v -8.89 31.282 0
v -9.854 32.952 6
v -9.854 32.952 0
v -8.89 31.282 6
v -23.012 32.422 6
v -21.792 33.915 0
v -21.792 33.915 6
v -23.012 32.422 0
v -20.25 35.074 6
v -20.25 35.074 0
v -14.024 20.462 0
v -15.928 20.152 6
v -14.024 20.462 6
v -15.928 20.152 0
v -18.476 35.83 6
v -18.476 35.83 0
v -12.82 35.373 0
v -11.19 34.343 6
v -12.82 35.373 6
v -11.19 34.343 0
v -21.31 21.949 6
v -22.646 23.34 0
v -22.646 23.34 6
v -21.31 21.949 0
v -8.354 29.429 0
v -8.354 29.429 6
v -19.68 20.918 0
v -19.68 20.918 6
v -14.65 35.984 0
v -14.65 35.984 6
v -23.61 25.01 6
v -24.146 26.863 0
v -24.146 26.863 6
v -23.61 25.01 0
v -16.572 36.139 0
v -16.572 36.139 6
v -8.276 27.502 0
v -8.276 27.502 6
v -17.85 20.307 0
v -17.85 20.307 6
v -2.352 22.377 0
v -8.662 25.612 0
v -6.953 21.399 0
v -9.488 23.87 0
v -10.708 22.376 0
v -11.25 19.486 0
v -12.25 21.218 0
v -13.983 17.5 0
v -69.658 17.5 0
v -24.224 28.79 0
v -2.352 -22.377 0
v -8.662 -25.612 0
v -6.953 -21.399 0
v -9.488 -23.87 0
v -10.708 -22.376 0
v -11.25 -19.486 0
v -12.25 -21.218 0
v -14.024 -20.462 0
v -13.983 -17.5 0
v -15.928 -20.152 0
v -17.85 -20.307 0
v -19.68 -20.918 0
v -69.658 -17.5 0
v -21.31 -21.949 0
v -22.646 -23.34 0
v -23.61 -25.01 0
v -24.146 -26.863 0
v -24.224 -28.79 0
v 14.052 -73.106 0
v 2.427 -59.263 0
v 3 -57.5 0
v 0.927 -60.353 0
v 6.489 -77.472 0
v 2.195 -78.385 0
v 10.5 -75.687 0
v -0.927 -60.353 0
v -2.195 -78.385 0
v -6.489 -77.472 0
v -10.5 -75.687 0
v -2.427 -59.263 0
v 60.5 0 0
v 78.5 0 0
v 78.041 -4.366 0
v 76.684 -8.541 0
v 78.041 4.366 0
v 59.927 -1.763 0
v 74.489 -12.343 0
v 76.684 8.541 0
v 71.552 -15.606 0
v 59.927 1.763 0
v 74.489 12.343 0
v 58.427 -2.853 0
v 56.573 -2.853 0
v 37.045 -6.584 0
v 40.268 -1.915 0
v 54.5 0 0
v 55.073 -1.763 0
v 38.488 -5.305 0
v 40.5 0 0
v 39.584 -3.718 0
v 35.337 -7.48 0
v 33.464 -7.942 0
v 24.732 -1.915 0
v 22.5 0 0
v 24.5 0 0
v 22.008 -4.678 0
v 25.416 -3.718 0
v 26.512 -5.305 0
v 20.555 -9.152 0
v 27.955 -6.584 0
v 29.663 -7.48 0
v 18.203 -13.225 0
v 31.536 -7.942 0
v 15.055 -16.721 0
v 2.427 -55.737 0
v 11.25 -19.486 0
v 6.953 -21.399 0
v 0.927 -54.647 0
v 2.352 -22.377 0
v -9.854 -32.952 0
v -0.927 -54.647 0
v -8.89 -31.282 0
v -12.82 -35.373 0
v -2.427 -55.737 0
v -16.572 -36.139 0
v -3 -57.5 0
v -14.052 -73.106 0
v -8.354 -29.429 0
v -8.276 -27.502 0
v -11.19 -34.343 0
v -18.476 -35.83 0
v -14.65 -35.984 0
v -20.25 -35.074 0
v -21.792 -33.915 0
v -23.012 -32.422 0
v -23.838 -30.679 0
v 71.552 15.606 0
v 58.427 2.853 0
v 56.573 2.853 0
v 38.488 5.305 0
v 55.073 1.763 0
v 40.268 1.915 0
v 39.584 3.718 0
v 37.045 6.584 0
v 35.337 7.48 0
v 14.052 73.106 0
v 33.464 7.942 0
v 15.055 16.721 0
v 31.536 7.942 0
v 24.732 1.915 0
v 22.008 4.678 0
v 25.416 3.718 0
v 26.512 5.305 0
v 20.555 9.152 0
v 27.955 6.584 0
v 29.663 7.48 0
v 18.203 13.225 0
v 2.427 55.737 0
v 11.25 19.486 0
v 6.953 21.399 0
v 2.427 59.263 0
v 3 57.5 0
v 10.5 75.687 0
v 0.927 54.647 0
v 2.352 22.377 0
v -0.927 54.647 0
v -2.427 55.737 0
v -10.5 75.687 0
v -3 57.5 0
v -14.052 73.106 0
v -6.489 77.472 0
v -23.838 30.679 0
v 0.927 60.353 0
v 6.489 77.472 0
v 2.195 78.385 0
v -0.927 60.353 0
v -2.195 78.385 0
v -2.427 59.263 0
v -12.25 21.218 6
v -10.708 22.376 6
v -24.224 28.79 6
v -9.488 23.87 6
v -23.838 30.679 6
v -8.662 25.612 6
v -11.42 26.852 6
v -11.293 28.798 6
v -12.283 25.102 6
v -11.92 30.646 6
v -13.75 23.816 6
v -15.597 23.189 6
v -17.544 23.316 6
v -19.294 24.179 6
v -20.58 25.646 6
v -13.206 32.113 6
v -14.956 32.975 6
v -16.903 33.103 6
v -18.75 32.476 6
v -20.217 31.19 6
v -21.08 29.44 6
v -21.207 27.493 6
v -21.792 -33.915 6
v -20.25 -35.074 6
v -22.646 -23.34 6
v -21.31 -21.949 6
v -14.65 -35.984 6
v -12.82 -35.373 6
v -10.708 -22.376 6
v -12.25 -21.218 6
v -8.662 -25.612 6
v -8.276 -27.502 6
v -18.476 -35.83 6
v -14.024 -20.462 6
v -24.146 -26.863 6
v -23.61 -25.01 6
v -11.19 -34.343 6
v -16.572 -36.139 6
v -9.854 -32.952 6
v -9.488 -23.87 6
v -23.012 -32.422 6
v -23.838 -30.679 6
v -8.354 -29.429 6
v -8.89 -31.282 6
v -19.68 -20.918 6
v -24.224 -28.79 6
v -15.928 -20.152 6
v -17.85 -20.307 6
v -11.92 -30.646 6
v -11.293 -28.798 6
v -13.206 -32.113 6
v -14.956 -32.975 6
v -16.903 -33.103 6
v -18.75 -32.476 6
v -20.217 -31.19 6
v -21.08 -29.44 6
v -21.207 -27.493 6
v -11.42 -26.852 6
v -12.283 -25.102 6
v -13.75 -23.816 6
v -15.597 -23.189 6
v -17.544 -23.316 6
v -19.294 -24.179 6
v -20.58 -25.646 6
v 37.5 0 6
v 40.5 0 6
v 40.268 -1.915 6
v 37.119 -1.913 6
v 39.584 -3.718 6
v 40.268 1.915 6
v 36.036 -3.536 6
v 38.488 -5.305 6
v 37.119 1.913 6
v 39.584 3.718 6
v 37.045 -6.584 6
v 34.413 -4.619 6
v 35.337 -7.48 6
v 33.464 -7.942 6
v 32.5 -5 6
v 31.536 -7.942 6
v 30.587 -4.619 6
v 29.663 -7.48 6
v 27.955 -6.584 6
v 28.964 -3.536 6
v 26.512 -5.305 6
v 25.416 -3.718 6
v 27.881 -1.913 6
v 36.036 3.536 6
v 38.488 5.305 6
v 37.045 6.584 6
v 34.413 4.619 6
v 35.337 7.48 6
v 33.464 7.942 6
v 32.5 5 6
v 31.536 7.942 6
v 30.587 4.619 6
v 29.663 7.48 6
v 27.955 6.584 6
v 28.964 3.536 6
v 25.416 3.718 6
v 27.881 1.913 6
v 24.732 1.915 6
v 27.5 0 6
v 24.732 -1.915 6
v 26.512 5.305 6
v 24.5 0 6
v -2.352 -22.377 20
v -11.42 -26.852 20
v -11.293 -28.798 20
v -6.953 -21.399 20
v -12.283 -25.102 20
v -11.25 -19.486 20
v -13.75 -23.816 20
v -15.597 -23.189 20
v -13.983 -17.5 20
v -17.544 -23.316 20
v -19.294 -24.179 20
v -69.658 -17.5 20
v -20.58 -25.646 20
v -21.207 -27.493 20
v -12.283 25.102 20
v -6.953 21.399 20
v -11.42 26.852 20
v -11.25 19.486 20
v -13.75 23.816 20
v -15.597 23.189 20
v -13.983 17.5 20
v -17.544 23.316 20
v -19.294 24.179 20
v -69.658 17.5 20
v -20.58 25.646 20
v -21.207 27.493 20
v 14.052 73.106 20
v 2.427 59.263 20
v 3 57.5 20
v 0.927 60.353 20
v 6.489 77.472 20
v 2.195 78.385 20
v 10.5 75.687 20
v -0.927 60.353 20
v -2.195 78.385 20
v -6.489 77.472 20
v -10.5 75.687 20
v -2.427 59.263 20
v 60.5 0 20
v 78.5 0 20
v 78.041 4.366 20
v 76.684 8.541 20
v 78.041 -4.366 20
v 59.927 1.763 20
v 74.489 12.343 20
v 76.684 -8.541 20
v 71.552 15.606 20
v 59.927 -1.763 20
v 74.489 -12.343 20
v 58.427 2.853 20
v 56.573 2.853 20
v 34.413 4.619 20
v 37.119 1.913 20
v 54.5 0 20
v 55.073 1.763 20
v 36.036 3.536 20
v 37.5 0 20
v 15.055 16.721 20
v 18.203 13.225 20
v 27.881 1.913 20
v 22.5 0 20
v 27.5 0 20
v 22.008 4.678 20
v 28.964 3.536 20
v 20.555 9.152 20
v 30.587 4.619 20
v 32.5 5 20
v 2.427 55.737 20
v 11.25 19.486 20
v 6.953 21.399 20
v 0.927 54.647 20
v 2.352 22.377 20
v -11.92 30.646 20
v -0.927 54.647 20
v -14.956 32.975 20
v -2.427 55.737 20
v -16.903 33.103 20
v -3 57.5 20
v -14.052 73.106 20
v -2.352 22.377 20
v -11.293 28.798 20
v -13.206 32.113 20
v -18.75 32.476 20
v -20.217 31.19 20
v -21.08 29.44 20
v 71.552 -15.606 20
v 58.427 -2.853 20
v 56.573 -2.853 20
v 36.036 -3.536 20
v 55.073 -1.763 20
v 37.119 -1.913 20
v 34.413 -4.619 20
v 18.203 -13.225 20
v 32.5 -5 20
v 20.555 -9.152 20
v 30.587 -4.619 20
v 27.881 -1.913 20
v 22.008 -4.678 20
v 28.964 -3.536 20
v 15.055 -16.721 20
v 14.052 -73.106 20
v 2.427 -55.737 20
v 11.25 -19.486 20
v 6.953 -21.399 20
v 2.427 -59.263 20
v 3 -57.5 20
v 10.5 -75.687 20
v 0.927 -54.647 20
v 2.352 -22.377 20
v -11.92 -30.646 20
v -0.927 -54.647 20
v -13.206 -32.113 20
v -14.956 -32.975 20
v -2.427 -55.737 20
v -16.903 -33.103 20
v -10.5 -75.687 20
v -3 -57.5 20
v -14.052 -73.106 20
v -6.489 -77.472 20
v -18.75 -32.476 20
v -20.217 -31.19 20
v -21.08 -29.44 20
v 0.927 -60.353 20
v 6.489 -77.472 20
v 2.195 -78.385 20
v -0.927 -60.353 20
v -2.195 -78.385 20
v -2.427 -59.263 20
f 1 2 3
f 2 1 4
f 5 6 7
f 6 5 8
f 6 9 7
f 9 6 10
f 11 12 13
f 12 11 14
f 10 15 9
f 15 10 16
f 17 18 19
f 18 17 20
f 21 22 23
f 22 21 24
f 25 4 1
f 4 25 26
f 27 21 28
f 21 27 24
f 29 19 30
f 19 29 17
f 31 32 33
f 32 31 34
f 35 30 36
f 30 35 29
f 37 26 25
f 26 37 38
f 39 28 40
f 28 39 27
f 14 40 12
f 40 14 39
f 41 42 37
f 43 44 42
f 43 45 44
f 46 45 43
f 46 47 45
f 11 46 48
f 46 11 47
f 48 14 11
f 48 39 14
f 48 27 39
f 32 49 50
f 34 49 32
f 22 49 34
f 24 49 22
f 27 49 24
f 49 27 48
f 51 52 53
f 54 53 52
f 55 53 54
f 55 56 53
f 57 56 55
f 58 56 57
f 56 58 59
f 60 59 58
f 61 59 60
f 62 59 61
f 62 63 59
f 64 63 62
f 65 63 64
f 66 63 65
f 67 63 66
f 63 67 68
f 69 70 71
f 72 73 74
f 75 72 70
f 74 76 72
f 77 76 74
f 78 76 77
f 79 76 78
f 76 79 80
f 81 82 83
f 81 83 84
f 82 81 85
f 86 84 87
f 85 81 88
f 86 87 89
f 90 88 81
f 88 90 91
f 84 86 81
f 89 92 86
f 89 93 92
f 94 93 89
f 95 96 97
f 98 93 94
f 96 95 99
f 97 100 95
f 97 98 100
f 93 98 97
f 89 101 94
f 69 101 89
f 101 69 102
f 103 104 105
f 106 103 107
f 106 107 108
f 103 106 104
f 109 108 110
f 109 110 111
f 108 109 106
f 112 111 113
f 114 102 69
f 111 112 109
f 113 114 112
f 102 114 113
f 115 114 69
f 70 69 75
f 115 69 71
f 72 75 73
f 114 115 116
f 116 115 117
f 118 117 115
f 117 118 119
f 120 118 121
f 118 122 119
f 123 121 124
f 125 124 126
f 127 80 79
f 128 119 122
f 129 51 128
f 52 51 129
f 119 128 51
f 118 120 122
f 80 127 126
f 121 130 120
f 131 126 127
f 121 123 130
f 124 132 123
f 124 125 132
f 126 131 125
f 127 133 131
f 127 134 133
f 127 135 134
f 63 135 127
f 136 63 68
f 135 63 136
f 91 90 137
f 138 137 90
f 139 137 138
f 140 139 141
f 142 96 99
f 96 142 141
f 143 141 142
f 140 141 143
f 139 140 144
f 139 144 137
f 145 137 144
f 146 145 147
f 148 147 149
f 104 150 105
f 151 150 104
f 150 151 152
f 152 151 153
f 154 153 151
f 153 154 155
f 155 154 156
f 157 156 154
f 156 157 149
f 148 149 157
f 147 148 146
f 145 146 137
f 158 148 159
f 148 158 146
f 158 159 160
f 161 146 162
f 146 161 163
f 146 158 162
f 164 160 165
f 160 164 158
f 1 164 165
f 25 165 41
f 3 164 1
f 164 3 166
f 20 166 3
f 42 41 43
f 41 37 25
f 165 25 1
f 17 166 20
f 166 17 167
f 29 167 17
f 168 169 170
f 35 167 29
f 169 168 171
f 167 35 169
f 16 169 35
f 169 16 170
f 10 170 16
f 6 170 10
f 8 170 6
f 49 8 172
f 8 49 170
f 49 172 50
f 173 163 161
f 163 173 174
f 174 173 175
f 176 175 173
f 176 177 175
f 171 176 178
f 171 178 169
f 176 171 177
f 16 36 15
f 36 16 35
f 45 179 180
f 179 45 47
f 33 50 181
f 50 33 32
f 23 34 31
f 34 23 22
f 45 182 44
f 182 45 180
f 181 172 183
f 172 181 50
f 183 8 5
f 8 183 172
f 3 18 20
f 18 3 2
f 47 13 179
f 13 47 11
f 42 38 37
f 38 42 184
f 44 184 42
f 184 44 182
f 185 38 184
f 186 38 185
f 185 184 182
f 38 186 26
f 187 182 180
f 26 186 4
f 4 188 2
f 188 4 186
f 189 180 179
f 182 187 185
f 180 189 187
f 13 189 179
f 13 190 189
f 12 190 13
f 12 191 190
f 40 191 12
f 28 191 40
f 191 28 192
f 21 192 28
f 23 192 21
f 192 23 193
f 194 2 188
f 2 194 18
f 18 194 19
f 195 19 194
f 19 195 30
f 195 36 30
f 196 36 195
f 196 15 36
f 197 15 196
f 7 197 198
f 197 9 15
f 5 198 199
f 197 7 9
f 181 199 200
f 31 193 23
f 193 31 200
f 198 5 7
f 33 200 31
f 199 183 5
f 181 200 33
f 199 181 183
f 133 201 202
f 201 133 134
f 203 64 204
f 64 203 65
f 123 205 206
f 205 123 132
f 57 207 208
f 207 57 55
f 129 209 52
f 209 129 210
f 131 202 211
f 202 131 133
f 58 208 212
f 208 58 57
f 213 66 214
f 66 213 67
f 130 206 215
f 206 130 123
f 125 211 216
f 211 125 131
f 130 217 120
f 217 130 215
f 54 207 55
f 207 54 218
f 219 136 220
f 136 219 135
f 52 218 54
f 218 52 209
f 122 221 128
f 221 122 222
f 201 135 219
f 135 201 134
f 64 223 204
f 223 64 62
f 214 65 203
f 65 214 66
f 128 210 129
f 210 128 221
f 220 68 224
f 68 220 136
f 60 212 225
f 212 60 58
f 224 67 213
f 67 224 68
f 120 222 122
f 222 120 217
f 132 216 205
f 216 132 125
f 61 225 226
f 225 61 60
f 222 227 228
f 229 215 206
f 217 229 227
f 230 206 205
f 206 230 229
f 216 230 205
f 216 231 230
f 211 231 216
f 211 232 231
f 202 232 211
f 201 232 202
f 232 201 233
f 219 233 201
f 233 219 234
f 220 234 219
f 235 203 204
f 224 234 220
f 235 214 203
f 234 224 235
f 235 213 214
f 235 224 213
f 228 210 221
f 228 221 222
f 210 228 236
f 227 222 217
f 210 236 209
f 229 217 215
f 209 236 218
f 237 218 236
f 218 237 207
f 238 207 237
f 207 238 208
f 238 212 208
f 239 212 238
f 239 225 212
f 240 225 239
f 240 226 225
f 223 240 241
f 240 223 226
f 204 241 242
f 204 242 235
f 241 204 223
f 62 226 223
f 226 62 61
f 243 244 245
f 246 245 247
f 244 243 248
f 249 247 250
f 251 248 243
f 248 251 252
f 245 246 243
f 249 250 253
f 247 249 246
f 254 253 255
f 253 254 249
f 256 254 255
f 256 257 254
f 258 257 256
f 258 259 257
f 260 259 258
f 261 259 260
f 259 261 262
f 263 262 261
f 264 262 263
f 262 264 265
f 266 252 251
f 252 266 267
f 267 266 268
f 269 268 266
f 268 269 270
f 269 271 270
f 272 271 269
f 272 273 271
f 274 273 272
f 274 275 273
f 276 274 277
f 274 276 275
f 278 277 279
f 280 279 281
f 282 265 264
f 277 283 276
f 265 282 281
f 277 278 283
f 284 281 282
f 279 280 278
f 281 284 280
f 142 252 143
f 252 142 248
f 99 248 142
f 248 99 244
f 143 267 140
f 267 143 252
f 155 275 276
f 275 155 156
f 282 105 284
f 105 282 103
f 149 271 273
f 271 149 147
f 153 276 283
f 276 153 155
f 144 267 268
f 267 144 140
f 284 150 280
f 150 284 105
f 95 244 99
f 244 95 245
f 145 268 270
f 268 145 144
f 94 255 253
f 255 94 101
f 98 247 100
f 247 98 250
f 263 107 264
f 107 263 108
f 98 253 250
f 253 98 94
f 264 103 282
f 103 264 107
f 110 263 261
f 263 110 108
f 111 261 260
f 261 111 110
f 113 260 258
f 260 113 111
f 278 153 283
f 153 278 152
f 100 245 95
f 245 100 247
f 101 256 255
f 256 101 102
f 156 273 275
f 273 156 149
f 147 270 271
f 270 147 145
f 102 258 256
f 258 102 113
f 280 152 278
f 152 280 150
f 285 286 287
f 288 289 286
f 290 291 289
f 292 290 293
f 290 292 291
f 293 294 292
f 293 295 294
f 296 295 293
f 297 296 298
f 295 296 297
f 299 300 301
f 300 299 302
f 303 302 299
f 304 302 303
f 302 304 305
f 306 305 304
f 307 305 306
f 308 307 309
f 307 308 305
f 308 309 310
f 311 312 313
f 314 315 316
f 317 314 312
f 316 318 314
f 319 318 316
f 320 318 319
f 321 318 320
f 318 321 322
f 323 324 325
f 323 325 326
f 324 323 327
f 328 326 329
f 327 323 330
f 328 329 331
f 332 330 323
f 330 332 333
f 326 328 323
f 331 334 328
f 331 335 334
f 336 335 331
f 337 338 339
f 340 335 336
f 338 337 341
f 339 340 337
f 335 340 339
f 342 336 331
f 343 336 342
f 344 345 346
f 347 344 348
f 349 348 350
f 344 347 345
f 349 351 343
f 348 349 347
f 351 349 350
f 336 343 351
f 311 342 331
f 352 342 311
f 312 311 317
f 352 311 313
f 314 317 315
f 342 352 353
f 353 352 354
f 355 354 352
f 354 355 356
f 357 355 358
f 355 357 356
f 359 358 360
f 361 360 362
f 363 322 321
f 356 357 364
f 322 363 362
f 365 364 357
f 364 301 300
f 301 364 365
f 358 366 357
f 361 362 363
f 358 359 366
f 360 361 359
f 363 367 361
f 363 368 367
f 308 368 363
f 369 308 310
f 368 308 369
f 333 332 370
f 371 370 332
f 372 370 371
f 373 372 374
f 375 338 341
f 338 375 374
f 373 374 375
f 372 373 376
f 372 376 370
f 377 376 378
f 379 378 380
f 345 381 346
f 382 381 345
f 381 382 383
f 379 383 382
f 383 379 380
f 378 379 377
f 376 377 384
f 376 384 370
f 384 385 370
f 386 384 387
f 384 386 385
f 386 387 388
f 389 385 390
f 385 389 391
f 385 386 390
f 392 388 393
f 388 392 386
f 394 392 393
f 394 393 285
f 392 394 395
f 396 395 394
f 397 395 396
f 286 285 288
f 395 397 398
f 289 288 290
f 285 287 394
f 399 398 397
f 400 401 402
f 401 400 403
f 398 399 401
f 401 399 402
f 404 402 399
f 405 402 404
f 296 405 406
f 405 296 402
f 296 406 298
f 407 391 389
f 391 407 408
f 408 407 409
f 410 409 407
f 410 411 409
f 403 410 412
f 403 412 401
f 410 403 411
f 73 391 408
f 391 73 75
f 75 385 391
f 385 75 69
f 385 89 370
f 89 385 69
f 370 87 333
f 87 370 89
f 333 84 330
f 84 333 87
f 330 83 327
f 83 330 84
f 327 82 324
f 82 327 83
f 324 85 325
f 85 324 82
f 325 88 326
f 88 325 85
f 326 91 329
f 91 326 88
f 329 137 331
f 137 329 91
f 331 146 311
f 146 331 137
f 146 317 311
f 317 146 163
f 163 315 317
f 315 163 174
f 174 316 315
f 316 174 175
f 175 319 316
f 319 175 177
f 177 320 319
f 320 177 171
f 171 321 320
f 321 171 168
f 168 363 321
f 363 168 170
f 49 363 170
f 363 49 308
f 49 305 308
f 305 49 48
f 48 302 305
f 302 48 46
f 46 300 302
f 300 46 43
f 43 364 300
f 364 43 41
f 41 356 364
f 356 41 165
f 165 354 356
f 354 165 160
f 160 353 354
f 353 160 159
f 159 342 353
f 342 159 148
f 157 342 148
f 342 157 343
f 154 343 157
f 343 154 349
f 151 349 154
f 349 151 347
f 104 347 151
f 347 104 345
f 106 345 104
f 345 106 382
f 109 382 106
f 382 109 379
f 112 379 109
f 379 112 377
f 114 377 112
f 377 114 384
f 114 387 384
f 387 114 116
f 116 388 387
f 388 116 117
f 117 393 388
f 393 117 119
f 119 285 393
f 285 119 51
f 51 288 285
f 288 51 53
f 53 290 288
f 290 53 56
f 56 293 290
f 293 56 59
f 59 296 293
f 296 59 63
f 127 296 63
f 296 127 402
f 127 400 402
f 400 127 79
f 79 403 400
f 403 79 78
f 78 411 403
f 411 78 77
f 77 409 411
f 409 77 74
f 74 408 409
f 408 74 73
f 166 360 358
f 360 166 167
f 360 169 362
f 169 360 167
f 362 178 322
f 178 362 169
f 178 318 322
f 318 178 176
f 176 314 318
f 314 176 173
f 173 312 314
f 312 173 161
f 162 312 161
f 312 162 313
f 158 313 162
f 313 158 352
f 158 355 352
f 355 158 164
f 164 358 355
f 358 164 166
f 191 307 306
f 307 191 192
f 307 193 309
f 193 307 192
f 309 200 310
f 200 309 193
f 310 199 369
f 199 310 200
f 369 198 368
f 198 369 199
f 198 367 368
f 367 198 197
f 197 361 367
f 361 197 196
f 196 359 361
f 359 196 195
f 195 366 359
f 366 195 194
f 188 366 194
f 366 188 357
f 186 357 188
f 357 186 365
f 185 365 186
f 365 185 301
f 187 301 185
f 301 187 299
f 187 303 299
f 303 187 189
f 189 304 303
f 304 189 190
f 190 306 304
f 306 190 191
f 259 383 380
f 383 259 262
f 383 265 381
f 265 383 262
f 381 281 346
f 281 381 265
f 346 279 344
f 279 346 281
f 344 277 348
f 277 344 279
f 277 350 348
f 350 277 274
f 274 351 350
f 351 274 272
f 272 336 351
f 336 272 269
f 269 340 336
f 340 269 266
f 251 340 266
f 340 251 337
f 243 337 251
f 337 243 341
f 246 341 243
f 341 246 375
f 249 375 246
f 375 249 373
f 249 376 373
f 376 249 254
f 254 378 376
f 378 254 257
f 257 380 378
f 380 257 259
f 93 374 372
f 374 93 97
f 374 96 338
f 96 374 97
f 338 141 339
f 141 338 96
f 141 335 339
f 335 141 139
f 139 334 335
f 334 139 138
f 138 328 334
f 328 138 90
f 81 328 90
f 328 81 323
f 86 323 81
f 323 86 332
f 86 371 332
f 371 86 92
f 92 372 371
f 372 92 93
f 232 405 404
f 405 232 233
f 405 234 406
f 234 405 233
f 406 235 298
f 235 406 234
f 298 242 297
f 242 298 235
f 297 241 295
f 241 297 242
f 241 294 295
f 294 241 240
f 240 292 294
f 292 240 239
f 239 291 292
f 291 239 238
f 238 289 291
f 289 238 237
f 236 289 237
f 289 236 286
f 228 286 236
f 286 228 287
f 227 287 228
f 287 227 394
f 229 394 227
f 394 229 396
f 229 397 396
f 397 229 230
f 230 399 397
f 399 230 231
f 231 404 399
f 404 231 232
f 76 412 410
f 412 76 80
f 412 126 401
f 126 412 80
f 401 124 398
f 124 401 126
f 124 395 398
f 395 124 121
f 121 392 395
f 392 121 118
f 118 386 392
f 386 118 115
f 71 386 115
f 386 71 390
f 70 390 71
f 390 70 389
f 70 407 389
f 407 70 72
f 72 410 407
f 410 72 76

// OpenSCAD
outer_hole_ring_d = 115;
outer_limit = 136;

difference(){
    linear_extrude(20)
        2d_baseplate();
    inner_bolts(65/2) cylinder(h=6, d=16, center=false); 
}

module inner_bolthole(){
    union(){
        cylinder(h=20, d=10, center=false);
        cylinder(h=6, d=16, center=false);
    }
}

module inner_bolts(radius){
    
      for (i = [1 : 3])
      rotate([0,0,i*(360/3)]) translate([radius,0]) children(0);
}

module 2d_baseplate(){
    radiuses = outer_limit - outer_hole_ring_d;
    difference(){
    hull(){
        translate([outer_hole_ring_d/2,0,0]){ 
            circle(r=radiuses);
        }
        translate([-(outer_hole_ring_d/2),0,0]){ 
            circle(r=radiuses);
        }
    
        translate([0,outer_hole_ring_d/2,0]){ 
            circle(r=radiuses);
        }
        translate([0,-(outer_hole_ring_d/2),0]){ 
            circle(r=radiuses);
        }
    }
    circle(d=45);
    translate([-50,0,0]) square([100,35], center=true);
    
            translate([outer_hole_ring_d/2,0,0]){ 
            circle(d=6);
        }
      
        translate([0,outer_hole_ring_d/2,0]){ 
            circle(d=6);
        }
        translate([0,-(outer_hole_ring_d/2),0]){ 
            circle(d=6);
        }
    inner_bolts(65/2) circle(d=10);
}
}
